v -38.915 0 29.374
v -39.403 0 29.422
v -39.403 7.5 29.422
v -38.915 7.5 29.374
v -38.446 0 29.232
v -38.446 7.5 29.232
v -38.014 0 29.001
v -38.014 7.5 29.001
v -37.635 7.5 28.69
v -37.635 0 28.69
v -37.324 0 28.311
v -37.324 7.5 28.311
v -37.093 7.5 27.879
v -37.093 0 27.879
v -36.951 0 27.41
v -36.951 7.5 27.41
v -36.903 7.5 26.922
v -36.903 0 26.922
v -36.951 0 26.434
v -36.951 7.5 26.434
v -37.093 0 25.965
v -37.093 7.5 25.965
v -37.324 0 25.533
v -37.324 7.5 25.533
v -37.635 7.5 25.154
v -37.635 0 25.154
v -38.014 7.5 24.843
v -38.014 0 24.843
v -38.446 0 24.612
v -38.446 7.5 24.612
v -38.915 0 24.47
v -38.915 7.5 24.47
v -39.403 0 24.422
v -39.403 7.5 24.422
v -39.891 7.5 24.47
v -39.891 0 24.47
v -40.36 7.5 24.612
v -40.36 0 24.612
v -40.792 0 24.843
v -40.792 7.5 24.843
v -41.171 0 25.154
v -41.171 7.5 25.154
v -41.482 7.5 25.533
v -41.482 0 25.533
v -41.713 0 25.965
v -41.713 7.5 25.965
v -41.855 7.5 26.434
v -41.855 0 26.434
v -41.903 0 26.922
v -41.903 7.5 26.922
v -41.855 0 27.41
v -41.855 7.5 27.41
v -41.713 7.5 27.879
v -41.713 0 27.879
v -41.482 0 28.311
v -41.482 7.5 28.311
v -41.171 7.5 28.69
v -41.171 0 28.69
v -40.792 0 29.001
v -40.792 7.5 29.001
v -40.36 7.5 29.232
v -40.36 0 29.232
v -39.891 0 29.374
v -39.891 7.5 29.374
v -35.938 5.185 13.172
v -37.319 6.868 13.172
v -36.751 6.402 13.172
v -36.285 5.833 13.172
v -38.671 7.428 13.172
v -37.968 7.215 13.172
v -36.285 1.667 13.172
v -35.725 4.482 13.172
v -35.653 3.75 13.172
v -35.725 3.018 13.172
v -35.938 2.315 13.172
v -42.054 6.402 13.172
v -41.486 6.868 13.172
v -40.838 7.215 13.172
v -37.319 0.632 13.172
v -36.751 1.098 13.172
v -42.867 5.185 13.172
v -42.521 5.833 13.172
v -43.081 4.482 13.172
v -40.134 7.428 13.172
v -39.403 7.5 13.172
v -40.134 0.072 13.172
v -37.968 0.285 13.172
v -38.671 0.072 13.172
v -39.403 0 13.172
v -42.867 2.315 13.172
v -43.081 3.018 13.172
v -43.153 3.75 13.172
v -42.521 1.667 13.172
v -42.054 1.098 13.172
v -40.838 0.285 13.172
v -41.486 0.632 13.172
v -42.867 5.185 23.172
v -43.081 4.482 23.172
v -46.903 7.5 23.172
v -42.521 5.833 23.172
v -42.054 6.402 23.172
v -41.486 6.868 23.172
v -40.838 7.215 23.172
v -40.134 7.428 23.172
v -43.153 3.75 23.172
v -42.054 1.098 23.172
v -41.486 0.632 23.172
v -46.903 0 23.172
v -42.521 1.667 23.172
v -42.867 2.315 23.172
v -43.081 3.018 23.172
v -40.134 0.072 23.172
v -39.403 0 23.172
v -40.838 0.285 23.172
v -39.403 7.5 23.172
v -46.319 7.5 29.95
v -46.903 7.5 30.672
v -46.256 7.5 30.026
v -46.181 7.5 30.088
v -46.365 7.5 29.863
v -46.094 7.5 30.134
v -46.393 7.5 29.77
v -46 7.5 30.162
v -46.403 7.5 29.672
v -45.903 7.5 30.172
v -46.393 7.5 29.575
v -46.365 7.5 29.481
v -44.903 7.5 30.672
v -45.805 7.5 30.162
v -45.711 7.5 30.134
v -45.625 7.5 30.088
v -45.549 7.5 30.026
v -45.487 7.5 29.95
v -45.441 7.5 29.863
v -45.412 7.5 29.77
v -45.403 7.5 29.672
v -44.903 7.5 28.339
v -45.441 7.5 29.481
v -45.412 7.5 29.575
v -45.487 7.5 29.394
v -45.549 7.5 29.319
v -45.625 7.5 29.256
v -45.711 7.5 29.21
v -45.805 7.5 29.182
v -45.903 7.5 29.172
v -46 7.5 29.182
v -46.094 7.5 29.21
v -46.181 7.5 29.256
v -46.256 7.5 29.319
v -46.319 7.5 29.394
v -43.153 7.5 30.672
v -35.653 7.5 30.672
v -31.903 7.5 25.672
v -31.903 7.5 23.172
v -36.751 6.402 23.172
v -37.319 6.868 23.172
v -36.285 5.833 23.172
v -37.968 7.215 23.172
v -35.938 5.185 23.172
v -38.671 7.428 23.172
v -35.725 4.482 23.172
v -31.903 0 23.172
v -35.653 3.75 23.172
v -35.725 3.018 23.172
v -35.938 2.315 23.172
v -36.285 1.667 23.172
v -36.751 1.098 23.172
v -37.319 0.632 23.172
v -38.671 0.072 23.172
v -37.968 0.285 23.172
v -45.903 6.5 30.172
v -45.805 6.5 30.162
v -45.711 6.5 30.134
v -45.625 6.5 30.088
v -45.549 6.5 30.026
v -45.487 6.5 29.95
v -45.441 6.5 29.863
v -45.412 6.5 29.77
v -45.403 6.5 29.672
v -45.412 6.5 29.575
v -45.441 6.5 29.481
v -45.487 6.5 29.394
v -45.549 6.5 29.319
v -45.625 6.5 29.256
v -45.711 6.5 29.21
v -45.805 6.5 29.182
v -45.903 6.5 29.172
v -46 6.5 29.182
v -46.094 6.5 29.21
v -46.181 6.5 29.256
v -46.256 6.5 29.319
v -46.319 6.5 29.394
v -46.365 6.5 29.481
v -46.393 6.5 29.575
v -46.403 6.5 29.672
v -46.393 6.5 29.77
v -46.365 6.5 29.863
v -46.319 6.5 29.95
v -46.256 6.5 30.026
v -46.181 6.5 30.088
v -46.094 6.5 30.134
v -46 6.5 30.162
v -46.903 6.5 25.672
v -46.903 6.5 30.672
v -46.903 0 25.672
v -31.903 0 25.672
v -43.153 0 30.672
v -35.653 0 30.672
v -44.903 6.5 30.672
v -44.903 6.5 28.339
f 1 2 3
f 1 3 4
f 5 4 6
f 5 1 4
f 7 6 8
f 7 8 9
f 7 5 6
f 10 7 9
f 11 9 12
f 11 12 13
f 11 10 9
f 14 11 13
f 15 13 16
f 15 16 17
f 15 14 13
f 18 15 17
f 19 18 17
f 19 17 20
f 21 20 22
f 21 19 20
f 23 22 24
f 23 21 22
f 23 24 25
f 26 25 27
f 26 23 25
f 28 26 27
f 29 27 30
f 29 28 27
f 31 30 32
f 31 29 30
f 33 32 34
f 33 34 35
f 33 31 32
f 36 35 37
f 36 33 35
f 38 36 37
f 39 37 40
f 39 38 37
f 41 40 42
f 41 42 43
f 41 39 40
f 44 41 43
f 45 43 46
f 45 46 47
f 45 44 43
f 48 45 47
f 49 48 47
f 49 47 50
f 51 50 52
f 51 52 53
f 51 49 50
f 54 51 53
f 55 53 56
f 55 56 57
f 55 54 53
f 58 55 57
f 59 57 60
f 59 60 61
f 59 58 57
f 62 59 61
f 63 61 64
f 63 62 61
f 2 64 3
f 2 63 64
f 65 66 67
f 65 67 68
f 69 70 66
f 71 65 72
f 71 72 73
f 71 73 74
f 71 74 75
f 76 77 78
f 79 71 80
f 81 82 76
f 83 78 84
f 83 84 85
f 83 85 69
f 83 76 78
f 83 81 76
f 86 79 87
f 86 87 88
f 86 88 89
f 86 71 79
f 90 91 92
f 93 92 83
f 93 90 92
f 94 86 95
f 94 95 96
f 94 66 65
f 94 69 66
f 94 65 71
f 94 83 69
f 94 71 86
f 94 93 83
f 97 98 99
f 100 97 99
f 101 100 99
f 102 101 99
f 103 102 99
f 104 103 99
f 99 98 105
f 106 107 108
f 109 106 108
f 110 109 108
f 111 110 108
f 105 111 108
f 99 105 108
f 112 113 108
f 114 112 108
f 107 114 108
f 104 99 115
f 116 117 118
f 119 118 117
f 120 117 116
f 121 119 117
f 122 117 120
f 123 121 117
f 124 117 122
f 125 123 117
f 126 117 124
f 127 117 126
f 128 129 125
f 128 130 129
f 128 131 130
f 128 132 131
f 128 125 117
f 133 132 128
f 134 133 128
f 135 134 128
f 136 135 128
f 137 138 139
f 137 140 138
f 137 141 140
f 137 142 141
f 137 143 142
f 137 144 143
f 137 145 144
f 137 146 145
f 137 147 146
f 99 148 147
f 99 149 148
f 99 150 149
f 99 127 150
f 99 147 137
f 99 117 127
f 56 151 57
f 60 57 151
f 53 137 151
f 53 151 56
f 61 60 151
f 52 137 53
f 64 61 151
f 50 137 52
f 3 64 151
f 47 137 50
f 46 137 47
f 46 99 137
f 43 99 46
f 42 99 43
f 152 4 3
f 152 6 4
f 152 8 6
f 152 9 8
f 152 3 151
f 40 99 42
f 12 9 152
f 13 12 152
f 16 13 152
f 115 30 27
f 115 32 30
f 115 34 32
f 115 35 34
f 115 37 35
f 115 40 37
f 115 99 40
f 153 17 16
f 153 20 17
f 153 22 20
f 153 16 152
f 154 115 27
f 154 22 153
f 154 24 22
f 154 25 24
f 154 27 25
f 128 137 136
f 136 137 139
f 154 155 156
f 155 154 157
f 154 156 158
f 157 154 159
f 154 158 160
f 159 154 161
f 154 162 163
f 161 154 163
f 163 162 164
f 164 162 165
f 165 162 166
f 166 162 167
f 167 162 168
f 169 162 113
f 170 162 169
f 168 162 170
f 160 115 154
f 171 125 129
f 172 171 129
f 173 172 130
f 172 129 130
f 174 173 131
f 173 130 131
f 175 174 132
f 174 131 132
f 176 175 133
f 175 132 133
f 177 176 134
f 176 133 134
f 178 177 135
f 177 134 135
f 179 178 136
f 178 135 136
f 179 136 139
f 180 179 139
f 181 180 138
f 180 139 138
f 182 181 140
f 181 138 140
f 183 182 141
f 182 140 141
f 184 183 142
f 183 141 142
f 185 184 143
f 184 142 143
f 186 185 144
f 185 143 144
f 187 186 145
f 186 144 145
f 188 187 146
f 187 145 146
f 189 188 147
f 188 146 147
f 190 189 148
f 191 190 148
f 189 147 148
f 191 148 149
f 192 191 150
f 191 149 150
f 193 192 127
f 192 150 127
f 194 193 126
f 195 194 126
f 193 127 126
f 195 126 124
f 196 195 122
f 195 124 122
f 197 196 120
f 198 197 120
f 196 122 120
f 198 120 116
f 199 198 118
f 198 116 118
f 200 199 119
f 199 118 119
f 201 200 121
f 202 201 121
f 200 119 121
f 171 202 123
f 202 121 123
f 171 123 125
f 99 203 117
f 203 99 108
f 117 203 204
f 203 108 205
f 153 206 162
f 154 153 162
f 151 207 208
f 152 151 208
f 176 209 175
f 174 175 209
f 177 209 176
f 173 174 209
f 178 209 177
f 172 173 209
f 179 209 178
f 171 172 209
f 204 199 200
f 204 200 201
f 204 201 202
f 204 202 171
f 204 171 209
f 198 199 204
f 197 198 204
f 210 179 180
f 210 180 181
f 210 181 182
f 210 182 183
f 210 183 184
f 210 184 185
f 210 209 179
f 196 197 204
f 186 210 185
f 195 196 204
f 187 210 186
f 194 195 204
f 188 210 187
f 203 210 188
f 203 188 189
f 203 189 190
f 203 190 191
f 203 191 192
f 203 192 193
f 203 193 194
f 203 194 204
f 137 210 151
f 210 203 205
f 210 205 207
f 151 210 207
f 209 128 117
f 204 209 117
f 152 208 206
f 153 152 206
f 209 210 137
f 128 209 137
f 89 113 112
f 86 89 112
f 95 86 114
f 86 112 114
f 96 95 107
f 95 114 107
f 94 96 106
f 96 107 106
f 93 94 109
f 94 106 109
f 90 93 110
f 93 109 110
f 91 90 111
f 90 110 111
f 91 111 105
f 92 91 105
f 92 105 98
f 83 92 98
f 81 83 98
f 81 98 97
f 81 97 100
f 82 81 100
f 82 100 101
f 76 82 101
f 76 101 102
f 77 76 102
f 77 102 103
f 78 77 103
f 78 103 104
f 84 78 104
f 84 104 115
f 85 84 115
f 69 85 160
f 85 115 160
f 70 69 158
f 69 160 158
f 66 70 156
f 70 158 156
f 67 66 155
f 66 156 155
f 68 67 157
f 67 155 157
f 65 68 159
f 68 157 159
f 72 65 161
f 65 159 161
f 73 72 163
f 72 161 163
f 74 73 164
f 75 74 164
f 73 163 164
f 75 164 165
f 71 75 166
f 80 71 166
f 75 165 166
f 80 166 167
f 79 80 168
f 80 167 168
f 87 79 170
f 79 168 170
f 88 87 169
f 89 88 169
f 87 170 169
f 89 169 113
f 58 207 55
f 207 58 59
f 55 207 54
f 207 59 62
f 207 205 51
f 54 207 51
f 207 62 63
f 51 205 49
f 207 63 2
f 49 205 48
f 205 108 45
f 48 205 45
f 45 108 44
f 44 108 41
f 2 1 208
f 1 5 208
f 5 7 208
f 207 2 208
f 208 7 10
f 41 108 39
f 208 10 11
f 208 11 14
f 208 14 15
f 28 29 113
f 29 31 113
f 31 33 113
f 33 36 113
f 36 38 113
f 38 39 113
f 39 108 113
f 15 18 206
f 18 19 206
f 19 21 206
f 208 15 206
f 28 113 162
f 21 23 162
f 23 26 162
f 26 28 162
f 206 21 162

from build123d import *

# Parameters (mm, degrees)
SKETCH1_R           = 2.5
BOSS_EXTRUDE1_DEPTH = 7.5
SKETCH2_R           = 3.75
BOSS_EXTRUDE2_DEPTH = 10
SKETCH3_W           = 2
SKETCH3_H           = 1
BOSS_EXTRUDE3_DEPTH = 7.5
SKETCH4_R           = 0.5
CUT_EXTRUDE1_DEPTH  = 1


with BuildPart() as part:
    # Sketch1 → Boss-Extrude1 (new body)
    with BuildSketch(Plane(origin=(0, 0, 0), x_dir=(1, 0, 0), z_dir=(0, 1, 0))):
        Polygon((-43.152827627, -30.672089533), (-35.652827627, -30.672089533), (-31.902827627, -25.672089533), (-31.902827627, -23.172089533), (-46.902827627, -23.172089533), (-46.902827627, -25.672089533), align=None)
        with Locations(Location((-39.402827627, -26.922089533, 0), (0, 0, 270))):
            Circle(SKETCH1_R, mode=Mode.SUBTRACT)
    extrude(amount=BOSS_EXTRUDE1_DEPTH)

    # Sketch2 → Boss-Extrude2 (add)
    with BuildSketch(Plane(origin=(0, 0, 23.172089533), x_dir=(-1, 0, 0), z_dir=(0, 0, -1))):
        with Locations(Location((39.402827627, 3.75, 0), (0, 0, 270))):
            Circle(SKETCH2_R)
    extrude(amount=BOSS_EXTRUDE2_DEPTH)

    # Sketch3 → Boss-Extrude3 (add)
    with BuildSketch(Plane(origin=(0, 0, 23.172089533), x_dir=(-1, 0, 0), z_dir=(0, 0, -1))):
        with Locations((45.902827627, 7)):
            Rectangle(SKETCH3_W, SKETCH3_H)
    extrude(amount=-BOSS_EXTRUDE3_DEPTH)

    # Sketch4 → Cut-Extrude1 (cut)
    with BuildSketch(Plane(origin=(0, 7.5, 0), x_dir=(1, 0, 0), z_dir=(0, 1, 0))):
        with Locations(Location((-45.902827627, -29.672089533, 0), (0, 0, 270))):
            Circle(SKETCH4_R)
    extrude(amount=-CUT_EXTRUDE1_DEPTH, mode=Mode.SUBTRACT)


solid = part.part
